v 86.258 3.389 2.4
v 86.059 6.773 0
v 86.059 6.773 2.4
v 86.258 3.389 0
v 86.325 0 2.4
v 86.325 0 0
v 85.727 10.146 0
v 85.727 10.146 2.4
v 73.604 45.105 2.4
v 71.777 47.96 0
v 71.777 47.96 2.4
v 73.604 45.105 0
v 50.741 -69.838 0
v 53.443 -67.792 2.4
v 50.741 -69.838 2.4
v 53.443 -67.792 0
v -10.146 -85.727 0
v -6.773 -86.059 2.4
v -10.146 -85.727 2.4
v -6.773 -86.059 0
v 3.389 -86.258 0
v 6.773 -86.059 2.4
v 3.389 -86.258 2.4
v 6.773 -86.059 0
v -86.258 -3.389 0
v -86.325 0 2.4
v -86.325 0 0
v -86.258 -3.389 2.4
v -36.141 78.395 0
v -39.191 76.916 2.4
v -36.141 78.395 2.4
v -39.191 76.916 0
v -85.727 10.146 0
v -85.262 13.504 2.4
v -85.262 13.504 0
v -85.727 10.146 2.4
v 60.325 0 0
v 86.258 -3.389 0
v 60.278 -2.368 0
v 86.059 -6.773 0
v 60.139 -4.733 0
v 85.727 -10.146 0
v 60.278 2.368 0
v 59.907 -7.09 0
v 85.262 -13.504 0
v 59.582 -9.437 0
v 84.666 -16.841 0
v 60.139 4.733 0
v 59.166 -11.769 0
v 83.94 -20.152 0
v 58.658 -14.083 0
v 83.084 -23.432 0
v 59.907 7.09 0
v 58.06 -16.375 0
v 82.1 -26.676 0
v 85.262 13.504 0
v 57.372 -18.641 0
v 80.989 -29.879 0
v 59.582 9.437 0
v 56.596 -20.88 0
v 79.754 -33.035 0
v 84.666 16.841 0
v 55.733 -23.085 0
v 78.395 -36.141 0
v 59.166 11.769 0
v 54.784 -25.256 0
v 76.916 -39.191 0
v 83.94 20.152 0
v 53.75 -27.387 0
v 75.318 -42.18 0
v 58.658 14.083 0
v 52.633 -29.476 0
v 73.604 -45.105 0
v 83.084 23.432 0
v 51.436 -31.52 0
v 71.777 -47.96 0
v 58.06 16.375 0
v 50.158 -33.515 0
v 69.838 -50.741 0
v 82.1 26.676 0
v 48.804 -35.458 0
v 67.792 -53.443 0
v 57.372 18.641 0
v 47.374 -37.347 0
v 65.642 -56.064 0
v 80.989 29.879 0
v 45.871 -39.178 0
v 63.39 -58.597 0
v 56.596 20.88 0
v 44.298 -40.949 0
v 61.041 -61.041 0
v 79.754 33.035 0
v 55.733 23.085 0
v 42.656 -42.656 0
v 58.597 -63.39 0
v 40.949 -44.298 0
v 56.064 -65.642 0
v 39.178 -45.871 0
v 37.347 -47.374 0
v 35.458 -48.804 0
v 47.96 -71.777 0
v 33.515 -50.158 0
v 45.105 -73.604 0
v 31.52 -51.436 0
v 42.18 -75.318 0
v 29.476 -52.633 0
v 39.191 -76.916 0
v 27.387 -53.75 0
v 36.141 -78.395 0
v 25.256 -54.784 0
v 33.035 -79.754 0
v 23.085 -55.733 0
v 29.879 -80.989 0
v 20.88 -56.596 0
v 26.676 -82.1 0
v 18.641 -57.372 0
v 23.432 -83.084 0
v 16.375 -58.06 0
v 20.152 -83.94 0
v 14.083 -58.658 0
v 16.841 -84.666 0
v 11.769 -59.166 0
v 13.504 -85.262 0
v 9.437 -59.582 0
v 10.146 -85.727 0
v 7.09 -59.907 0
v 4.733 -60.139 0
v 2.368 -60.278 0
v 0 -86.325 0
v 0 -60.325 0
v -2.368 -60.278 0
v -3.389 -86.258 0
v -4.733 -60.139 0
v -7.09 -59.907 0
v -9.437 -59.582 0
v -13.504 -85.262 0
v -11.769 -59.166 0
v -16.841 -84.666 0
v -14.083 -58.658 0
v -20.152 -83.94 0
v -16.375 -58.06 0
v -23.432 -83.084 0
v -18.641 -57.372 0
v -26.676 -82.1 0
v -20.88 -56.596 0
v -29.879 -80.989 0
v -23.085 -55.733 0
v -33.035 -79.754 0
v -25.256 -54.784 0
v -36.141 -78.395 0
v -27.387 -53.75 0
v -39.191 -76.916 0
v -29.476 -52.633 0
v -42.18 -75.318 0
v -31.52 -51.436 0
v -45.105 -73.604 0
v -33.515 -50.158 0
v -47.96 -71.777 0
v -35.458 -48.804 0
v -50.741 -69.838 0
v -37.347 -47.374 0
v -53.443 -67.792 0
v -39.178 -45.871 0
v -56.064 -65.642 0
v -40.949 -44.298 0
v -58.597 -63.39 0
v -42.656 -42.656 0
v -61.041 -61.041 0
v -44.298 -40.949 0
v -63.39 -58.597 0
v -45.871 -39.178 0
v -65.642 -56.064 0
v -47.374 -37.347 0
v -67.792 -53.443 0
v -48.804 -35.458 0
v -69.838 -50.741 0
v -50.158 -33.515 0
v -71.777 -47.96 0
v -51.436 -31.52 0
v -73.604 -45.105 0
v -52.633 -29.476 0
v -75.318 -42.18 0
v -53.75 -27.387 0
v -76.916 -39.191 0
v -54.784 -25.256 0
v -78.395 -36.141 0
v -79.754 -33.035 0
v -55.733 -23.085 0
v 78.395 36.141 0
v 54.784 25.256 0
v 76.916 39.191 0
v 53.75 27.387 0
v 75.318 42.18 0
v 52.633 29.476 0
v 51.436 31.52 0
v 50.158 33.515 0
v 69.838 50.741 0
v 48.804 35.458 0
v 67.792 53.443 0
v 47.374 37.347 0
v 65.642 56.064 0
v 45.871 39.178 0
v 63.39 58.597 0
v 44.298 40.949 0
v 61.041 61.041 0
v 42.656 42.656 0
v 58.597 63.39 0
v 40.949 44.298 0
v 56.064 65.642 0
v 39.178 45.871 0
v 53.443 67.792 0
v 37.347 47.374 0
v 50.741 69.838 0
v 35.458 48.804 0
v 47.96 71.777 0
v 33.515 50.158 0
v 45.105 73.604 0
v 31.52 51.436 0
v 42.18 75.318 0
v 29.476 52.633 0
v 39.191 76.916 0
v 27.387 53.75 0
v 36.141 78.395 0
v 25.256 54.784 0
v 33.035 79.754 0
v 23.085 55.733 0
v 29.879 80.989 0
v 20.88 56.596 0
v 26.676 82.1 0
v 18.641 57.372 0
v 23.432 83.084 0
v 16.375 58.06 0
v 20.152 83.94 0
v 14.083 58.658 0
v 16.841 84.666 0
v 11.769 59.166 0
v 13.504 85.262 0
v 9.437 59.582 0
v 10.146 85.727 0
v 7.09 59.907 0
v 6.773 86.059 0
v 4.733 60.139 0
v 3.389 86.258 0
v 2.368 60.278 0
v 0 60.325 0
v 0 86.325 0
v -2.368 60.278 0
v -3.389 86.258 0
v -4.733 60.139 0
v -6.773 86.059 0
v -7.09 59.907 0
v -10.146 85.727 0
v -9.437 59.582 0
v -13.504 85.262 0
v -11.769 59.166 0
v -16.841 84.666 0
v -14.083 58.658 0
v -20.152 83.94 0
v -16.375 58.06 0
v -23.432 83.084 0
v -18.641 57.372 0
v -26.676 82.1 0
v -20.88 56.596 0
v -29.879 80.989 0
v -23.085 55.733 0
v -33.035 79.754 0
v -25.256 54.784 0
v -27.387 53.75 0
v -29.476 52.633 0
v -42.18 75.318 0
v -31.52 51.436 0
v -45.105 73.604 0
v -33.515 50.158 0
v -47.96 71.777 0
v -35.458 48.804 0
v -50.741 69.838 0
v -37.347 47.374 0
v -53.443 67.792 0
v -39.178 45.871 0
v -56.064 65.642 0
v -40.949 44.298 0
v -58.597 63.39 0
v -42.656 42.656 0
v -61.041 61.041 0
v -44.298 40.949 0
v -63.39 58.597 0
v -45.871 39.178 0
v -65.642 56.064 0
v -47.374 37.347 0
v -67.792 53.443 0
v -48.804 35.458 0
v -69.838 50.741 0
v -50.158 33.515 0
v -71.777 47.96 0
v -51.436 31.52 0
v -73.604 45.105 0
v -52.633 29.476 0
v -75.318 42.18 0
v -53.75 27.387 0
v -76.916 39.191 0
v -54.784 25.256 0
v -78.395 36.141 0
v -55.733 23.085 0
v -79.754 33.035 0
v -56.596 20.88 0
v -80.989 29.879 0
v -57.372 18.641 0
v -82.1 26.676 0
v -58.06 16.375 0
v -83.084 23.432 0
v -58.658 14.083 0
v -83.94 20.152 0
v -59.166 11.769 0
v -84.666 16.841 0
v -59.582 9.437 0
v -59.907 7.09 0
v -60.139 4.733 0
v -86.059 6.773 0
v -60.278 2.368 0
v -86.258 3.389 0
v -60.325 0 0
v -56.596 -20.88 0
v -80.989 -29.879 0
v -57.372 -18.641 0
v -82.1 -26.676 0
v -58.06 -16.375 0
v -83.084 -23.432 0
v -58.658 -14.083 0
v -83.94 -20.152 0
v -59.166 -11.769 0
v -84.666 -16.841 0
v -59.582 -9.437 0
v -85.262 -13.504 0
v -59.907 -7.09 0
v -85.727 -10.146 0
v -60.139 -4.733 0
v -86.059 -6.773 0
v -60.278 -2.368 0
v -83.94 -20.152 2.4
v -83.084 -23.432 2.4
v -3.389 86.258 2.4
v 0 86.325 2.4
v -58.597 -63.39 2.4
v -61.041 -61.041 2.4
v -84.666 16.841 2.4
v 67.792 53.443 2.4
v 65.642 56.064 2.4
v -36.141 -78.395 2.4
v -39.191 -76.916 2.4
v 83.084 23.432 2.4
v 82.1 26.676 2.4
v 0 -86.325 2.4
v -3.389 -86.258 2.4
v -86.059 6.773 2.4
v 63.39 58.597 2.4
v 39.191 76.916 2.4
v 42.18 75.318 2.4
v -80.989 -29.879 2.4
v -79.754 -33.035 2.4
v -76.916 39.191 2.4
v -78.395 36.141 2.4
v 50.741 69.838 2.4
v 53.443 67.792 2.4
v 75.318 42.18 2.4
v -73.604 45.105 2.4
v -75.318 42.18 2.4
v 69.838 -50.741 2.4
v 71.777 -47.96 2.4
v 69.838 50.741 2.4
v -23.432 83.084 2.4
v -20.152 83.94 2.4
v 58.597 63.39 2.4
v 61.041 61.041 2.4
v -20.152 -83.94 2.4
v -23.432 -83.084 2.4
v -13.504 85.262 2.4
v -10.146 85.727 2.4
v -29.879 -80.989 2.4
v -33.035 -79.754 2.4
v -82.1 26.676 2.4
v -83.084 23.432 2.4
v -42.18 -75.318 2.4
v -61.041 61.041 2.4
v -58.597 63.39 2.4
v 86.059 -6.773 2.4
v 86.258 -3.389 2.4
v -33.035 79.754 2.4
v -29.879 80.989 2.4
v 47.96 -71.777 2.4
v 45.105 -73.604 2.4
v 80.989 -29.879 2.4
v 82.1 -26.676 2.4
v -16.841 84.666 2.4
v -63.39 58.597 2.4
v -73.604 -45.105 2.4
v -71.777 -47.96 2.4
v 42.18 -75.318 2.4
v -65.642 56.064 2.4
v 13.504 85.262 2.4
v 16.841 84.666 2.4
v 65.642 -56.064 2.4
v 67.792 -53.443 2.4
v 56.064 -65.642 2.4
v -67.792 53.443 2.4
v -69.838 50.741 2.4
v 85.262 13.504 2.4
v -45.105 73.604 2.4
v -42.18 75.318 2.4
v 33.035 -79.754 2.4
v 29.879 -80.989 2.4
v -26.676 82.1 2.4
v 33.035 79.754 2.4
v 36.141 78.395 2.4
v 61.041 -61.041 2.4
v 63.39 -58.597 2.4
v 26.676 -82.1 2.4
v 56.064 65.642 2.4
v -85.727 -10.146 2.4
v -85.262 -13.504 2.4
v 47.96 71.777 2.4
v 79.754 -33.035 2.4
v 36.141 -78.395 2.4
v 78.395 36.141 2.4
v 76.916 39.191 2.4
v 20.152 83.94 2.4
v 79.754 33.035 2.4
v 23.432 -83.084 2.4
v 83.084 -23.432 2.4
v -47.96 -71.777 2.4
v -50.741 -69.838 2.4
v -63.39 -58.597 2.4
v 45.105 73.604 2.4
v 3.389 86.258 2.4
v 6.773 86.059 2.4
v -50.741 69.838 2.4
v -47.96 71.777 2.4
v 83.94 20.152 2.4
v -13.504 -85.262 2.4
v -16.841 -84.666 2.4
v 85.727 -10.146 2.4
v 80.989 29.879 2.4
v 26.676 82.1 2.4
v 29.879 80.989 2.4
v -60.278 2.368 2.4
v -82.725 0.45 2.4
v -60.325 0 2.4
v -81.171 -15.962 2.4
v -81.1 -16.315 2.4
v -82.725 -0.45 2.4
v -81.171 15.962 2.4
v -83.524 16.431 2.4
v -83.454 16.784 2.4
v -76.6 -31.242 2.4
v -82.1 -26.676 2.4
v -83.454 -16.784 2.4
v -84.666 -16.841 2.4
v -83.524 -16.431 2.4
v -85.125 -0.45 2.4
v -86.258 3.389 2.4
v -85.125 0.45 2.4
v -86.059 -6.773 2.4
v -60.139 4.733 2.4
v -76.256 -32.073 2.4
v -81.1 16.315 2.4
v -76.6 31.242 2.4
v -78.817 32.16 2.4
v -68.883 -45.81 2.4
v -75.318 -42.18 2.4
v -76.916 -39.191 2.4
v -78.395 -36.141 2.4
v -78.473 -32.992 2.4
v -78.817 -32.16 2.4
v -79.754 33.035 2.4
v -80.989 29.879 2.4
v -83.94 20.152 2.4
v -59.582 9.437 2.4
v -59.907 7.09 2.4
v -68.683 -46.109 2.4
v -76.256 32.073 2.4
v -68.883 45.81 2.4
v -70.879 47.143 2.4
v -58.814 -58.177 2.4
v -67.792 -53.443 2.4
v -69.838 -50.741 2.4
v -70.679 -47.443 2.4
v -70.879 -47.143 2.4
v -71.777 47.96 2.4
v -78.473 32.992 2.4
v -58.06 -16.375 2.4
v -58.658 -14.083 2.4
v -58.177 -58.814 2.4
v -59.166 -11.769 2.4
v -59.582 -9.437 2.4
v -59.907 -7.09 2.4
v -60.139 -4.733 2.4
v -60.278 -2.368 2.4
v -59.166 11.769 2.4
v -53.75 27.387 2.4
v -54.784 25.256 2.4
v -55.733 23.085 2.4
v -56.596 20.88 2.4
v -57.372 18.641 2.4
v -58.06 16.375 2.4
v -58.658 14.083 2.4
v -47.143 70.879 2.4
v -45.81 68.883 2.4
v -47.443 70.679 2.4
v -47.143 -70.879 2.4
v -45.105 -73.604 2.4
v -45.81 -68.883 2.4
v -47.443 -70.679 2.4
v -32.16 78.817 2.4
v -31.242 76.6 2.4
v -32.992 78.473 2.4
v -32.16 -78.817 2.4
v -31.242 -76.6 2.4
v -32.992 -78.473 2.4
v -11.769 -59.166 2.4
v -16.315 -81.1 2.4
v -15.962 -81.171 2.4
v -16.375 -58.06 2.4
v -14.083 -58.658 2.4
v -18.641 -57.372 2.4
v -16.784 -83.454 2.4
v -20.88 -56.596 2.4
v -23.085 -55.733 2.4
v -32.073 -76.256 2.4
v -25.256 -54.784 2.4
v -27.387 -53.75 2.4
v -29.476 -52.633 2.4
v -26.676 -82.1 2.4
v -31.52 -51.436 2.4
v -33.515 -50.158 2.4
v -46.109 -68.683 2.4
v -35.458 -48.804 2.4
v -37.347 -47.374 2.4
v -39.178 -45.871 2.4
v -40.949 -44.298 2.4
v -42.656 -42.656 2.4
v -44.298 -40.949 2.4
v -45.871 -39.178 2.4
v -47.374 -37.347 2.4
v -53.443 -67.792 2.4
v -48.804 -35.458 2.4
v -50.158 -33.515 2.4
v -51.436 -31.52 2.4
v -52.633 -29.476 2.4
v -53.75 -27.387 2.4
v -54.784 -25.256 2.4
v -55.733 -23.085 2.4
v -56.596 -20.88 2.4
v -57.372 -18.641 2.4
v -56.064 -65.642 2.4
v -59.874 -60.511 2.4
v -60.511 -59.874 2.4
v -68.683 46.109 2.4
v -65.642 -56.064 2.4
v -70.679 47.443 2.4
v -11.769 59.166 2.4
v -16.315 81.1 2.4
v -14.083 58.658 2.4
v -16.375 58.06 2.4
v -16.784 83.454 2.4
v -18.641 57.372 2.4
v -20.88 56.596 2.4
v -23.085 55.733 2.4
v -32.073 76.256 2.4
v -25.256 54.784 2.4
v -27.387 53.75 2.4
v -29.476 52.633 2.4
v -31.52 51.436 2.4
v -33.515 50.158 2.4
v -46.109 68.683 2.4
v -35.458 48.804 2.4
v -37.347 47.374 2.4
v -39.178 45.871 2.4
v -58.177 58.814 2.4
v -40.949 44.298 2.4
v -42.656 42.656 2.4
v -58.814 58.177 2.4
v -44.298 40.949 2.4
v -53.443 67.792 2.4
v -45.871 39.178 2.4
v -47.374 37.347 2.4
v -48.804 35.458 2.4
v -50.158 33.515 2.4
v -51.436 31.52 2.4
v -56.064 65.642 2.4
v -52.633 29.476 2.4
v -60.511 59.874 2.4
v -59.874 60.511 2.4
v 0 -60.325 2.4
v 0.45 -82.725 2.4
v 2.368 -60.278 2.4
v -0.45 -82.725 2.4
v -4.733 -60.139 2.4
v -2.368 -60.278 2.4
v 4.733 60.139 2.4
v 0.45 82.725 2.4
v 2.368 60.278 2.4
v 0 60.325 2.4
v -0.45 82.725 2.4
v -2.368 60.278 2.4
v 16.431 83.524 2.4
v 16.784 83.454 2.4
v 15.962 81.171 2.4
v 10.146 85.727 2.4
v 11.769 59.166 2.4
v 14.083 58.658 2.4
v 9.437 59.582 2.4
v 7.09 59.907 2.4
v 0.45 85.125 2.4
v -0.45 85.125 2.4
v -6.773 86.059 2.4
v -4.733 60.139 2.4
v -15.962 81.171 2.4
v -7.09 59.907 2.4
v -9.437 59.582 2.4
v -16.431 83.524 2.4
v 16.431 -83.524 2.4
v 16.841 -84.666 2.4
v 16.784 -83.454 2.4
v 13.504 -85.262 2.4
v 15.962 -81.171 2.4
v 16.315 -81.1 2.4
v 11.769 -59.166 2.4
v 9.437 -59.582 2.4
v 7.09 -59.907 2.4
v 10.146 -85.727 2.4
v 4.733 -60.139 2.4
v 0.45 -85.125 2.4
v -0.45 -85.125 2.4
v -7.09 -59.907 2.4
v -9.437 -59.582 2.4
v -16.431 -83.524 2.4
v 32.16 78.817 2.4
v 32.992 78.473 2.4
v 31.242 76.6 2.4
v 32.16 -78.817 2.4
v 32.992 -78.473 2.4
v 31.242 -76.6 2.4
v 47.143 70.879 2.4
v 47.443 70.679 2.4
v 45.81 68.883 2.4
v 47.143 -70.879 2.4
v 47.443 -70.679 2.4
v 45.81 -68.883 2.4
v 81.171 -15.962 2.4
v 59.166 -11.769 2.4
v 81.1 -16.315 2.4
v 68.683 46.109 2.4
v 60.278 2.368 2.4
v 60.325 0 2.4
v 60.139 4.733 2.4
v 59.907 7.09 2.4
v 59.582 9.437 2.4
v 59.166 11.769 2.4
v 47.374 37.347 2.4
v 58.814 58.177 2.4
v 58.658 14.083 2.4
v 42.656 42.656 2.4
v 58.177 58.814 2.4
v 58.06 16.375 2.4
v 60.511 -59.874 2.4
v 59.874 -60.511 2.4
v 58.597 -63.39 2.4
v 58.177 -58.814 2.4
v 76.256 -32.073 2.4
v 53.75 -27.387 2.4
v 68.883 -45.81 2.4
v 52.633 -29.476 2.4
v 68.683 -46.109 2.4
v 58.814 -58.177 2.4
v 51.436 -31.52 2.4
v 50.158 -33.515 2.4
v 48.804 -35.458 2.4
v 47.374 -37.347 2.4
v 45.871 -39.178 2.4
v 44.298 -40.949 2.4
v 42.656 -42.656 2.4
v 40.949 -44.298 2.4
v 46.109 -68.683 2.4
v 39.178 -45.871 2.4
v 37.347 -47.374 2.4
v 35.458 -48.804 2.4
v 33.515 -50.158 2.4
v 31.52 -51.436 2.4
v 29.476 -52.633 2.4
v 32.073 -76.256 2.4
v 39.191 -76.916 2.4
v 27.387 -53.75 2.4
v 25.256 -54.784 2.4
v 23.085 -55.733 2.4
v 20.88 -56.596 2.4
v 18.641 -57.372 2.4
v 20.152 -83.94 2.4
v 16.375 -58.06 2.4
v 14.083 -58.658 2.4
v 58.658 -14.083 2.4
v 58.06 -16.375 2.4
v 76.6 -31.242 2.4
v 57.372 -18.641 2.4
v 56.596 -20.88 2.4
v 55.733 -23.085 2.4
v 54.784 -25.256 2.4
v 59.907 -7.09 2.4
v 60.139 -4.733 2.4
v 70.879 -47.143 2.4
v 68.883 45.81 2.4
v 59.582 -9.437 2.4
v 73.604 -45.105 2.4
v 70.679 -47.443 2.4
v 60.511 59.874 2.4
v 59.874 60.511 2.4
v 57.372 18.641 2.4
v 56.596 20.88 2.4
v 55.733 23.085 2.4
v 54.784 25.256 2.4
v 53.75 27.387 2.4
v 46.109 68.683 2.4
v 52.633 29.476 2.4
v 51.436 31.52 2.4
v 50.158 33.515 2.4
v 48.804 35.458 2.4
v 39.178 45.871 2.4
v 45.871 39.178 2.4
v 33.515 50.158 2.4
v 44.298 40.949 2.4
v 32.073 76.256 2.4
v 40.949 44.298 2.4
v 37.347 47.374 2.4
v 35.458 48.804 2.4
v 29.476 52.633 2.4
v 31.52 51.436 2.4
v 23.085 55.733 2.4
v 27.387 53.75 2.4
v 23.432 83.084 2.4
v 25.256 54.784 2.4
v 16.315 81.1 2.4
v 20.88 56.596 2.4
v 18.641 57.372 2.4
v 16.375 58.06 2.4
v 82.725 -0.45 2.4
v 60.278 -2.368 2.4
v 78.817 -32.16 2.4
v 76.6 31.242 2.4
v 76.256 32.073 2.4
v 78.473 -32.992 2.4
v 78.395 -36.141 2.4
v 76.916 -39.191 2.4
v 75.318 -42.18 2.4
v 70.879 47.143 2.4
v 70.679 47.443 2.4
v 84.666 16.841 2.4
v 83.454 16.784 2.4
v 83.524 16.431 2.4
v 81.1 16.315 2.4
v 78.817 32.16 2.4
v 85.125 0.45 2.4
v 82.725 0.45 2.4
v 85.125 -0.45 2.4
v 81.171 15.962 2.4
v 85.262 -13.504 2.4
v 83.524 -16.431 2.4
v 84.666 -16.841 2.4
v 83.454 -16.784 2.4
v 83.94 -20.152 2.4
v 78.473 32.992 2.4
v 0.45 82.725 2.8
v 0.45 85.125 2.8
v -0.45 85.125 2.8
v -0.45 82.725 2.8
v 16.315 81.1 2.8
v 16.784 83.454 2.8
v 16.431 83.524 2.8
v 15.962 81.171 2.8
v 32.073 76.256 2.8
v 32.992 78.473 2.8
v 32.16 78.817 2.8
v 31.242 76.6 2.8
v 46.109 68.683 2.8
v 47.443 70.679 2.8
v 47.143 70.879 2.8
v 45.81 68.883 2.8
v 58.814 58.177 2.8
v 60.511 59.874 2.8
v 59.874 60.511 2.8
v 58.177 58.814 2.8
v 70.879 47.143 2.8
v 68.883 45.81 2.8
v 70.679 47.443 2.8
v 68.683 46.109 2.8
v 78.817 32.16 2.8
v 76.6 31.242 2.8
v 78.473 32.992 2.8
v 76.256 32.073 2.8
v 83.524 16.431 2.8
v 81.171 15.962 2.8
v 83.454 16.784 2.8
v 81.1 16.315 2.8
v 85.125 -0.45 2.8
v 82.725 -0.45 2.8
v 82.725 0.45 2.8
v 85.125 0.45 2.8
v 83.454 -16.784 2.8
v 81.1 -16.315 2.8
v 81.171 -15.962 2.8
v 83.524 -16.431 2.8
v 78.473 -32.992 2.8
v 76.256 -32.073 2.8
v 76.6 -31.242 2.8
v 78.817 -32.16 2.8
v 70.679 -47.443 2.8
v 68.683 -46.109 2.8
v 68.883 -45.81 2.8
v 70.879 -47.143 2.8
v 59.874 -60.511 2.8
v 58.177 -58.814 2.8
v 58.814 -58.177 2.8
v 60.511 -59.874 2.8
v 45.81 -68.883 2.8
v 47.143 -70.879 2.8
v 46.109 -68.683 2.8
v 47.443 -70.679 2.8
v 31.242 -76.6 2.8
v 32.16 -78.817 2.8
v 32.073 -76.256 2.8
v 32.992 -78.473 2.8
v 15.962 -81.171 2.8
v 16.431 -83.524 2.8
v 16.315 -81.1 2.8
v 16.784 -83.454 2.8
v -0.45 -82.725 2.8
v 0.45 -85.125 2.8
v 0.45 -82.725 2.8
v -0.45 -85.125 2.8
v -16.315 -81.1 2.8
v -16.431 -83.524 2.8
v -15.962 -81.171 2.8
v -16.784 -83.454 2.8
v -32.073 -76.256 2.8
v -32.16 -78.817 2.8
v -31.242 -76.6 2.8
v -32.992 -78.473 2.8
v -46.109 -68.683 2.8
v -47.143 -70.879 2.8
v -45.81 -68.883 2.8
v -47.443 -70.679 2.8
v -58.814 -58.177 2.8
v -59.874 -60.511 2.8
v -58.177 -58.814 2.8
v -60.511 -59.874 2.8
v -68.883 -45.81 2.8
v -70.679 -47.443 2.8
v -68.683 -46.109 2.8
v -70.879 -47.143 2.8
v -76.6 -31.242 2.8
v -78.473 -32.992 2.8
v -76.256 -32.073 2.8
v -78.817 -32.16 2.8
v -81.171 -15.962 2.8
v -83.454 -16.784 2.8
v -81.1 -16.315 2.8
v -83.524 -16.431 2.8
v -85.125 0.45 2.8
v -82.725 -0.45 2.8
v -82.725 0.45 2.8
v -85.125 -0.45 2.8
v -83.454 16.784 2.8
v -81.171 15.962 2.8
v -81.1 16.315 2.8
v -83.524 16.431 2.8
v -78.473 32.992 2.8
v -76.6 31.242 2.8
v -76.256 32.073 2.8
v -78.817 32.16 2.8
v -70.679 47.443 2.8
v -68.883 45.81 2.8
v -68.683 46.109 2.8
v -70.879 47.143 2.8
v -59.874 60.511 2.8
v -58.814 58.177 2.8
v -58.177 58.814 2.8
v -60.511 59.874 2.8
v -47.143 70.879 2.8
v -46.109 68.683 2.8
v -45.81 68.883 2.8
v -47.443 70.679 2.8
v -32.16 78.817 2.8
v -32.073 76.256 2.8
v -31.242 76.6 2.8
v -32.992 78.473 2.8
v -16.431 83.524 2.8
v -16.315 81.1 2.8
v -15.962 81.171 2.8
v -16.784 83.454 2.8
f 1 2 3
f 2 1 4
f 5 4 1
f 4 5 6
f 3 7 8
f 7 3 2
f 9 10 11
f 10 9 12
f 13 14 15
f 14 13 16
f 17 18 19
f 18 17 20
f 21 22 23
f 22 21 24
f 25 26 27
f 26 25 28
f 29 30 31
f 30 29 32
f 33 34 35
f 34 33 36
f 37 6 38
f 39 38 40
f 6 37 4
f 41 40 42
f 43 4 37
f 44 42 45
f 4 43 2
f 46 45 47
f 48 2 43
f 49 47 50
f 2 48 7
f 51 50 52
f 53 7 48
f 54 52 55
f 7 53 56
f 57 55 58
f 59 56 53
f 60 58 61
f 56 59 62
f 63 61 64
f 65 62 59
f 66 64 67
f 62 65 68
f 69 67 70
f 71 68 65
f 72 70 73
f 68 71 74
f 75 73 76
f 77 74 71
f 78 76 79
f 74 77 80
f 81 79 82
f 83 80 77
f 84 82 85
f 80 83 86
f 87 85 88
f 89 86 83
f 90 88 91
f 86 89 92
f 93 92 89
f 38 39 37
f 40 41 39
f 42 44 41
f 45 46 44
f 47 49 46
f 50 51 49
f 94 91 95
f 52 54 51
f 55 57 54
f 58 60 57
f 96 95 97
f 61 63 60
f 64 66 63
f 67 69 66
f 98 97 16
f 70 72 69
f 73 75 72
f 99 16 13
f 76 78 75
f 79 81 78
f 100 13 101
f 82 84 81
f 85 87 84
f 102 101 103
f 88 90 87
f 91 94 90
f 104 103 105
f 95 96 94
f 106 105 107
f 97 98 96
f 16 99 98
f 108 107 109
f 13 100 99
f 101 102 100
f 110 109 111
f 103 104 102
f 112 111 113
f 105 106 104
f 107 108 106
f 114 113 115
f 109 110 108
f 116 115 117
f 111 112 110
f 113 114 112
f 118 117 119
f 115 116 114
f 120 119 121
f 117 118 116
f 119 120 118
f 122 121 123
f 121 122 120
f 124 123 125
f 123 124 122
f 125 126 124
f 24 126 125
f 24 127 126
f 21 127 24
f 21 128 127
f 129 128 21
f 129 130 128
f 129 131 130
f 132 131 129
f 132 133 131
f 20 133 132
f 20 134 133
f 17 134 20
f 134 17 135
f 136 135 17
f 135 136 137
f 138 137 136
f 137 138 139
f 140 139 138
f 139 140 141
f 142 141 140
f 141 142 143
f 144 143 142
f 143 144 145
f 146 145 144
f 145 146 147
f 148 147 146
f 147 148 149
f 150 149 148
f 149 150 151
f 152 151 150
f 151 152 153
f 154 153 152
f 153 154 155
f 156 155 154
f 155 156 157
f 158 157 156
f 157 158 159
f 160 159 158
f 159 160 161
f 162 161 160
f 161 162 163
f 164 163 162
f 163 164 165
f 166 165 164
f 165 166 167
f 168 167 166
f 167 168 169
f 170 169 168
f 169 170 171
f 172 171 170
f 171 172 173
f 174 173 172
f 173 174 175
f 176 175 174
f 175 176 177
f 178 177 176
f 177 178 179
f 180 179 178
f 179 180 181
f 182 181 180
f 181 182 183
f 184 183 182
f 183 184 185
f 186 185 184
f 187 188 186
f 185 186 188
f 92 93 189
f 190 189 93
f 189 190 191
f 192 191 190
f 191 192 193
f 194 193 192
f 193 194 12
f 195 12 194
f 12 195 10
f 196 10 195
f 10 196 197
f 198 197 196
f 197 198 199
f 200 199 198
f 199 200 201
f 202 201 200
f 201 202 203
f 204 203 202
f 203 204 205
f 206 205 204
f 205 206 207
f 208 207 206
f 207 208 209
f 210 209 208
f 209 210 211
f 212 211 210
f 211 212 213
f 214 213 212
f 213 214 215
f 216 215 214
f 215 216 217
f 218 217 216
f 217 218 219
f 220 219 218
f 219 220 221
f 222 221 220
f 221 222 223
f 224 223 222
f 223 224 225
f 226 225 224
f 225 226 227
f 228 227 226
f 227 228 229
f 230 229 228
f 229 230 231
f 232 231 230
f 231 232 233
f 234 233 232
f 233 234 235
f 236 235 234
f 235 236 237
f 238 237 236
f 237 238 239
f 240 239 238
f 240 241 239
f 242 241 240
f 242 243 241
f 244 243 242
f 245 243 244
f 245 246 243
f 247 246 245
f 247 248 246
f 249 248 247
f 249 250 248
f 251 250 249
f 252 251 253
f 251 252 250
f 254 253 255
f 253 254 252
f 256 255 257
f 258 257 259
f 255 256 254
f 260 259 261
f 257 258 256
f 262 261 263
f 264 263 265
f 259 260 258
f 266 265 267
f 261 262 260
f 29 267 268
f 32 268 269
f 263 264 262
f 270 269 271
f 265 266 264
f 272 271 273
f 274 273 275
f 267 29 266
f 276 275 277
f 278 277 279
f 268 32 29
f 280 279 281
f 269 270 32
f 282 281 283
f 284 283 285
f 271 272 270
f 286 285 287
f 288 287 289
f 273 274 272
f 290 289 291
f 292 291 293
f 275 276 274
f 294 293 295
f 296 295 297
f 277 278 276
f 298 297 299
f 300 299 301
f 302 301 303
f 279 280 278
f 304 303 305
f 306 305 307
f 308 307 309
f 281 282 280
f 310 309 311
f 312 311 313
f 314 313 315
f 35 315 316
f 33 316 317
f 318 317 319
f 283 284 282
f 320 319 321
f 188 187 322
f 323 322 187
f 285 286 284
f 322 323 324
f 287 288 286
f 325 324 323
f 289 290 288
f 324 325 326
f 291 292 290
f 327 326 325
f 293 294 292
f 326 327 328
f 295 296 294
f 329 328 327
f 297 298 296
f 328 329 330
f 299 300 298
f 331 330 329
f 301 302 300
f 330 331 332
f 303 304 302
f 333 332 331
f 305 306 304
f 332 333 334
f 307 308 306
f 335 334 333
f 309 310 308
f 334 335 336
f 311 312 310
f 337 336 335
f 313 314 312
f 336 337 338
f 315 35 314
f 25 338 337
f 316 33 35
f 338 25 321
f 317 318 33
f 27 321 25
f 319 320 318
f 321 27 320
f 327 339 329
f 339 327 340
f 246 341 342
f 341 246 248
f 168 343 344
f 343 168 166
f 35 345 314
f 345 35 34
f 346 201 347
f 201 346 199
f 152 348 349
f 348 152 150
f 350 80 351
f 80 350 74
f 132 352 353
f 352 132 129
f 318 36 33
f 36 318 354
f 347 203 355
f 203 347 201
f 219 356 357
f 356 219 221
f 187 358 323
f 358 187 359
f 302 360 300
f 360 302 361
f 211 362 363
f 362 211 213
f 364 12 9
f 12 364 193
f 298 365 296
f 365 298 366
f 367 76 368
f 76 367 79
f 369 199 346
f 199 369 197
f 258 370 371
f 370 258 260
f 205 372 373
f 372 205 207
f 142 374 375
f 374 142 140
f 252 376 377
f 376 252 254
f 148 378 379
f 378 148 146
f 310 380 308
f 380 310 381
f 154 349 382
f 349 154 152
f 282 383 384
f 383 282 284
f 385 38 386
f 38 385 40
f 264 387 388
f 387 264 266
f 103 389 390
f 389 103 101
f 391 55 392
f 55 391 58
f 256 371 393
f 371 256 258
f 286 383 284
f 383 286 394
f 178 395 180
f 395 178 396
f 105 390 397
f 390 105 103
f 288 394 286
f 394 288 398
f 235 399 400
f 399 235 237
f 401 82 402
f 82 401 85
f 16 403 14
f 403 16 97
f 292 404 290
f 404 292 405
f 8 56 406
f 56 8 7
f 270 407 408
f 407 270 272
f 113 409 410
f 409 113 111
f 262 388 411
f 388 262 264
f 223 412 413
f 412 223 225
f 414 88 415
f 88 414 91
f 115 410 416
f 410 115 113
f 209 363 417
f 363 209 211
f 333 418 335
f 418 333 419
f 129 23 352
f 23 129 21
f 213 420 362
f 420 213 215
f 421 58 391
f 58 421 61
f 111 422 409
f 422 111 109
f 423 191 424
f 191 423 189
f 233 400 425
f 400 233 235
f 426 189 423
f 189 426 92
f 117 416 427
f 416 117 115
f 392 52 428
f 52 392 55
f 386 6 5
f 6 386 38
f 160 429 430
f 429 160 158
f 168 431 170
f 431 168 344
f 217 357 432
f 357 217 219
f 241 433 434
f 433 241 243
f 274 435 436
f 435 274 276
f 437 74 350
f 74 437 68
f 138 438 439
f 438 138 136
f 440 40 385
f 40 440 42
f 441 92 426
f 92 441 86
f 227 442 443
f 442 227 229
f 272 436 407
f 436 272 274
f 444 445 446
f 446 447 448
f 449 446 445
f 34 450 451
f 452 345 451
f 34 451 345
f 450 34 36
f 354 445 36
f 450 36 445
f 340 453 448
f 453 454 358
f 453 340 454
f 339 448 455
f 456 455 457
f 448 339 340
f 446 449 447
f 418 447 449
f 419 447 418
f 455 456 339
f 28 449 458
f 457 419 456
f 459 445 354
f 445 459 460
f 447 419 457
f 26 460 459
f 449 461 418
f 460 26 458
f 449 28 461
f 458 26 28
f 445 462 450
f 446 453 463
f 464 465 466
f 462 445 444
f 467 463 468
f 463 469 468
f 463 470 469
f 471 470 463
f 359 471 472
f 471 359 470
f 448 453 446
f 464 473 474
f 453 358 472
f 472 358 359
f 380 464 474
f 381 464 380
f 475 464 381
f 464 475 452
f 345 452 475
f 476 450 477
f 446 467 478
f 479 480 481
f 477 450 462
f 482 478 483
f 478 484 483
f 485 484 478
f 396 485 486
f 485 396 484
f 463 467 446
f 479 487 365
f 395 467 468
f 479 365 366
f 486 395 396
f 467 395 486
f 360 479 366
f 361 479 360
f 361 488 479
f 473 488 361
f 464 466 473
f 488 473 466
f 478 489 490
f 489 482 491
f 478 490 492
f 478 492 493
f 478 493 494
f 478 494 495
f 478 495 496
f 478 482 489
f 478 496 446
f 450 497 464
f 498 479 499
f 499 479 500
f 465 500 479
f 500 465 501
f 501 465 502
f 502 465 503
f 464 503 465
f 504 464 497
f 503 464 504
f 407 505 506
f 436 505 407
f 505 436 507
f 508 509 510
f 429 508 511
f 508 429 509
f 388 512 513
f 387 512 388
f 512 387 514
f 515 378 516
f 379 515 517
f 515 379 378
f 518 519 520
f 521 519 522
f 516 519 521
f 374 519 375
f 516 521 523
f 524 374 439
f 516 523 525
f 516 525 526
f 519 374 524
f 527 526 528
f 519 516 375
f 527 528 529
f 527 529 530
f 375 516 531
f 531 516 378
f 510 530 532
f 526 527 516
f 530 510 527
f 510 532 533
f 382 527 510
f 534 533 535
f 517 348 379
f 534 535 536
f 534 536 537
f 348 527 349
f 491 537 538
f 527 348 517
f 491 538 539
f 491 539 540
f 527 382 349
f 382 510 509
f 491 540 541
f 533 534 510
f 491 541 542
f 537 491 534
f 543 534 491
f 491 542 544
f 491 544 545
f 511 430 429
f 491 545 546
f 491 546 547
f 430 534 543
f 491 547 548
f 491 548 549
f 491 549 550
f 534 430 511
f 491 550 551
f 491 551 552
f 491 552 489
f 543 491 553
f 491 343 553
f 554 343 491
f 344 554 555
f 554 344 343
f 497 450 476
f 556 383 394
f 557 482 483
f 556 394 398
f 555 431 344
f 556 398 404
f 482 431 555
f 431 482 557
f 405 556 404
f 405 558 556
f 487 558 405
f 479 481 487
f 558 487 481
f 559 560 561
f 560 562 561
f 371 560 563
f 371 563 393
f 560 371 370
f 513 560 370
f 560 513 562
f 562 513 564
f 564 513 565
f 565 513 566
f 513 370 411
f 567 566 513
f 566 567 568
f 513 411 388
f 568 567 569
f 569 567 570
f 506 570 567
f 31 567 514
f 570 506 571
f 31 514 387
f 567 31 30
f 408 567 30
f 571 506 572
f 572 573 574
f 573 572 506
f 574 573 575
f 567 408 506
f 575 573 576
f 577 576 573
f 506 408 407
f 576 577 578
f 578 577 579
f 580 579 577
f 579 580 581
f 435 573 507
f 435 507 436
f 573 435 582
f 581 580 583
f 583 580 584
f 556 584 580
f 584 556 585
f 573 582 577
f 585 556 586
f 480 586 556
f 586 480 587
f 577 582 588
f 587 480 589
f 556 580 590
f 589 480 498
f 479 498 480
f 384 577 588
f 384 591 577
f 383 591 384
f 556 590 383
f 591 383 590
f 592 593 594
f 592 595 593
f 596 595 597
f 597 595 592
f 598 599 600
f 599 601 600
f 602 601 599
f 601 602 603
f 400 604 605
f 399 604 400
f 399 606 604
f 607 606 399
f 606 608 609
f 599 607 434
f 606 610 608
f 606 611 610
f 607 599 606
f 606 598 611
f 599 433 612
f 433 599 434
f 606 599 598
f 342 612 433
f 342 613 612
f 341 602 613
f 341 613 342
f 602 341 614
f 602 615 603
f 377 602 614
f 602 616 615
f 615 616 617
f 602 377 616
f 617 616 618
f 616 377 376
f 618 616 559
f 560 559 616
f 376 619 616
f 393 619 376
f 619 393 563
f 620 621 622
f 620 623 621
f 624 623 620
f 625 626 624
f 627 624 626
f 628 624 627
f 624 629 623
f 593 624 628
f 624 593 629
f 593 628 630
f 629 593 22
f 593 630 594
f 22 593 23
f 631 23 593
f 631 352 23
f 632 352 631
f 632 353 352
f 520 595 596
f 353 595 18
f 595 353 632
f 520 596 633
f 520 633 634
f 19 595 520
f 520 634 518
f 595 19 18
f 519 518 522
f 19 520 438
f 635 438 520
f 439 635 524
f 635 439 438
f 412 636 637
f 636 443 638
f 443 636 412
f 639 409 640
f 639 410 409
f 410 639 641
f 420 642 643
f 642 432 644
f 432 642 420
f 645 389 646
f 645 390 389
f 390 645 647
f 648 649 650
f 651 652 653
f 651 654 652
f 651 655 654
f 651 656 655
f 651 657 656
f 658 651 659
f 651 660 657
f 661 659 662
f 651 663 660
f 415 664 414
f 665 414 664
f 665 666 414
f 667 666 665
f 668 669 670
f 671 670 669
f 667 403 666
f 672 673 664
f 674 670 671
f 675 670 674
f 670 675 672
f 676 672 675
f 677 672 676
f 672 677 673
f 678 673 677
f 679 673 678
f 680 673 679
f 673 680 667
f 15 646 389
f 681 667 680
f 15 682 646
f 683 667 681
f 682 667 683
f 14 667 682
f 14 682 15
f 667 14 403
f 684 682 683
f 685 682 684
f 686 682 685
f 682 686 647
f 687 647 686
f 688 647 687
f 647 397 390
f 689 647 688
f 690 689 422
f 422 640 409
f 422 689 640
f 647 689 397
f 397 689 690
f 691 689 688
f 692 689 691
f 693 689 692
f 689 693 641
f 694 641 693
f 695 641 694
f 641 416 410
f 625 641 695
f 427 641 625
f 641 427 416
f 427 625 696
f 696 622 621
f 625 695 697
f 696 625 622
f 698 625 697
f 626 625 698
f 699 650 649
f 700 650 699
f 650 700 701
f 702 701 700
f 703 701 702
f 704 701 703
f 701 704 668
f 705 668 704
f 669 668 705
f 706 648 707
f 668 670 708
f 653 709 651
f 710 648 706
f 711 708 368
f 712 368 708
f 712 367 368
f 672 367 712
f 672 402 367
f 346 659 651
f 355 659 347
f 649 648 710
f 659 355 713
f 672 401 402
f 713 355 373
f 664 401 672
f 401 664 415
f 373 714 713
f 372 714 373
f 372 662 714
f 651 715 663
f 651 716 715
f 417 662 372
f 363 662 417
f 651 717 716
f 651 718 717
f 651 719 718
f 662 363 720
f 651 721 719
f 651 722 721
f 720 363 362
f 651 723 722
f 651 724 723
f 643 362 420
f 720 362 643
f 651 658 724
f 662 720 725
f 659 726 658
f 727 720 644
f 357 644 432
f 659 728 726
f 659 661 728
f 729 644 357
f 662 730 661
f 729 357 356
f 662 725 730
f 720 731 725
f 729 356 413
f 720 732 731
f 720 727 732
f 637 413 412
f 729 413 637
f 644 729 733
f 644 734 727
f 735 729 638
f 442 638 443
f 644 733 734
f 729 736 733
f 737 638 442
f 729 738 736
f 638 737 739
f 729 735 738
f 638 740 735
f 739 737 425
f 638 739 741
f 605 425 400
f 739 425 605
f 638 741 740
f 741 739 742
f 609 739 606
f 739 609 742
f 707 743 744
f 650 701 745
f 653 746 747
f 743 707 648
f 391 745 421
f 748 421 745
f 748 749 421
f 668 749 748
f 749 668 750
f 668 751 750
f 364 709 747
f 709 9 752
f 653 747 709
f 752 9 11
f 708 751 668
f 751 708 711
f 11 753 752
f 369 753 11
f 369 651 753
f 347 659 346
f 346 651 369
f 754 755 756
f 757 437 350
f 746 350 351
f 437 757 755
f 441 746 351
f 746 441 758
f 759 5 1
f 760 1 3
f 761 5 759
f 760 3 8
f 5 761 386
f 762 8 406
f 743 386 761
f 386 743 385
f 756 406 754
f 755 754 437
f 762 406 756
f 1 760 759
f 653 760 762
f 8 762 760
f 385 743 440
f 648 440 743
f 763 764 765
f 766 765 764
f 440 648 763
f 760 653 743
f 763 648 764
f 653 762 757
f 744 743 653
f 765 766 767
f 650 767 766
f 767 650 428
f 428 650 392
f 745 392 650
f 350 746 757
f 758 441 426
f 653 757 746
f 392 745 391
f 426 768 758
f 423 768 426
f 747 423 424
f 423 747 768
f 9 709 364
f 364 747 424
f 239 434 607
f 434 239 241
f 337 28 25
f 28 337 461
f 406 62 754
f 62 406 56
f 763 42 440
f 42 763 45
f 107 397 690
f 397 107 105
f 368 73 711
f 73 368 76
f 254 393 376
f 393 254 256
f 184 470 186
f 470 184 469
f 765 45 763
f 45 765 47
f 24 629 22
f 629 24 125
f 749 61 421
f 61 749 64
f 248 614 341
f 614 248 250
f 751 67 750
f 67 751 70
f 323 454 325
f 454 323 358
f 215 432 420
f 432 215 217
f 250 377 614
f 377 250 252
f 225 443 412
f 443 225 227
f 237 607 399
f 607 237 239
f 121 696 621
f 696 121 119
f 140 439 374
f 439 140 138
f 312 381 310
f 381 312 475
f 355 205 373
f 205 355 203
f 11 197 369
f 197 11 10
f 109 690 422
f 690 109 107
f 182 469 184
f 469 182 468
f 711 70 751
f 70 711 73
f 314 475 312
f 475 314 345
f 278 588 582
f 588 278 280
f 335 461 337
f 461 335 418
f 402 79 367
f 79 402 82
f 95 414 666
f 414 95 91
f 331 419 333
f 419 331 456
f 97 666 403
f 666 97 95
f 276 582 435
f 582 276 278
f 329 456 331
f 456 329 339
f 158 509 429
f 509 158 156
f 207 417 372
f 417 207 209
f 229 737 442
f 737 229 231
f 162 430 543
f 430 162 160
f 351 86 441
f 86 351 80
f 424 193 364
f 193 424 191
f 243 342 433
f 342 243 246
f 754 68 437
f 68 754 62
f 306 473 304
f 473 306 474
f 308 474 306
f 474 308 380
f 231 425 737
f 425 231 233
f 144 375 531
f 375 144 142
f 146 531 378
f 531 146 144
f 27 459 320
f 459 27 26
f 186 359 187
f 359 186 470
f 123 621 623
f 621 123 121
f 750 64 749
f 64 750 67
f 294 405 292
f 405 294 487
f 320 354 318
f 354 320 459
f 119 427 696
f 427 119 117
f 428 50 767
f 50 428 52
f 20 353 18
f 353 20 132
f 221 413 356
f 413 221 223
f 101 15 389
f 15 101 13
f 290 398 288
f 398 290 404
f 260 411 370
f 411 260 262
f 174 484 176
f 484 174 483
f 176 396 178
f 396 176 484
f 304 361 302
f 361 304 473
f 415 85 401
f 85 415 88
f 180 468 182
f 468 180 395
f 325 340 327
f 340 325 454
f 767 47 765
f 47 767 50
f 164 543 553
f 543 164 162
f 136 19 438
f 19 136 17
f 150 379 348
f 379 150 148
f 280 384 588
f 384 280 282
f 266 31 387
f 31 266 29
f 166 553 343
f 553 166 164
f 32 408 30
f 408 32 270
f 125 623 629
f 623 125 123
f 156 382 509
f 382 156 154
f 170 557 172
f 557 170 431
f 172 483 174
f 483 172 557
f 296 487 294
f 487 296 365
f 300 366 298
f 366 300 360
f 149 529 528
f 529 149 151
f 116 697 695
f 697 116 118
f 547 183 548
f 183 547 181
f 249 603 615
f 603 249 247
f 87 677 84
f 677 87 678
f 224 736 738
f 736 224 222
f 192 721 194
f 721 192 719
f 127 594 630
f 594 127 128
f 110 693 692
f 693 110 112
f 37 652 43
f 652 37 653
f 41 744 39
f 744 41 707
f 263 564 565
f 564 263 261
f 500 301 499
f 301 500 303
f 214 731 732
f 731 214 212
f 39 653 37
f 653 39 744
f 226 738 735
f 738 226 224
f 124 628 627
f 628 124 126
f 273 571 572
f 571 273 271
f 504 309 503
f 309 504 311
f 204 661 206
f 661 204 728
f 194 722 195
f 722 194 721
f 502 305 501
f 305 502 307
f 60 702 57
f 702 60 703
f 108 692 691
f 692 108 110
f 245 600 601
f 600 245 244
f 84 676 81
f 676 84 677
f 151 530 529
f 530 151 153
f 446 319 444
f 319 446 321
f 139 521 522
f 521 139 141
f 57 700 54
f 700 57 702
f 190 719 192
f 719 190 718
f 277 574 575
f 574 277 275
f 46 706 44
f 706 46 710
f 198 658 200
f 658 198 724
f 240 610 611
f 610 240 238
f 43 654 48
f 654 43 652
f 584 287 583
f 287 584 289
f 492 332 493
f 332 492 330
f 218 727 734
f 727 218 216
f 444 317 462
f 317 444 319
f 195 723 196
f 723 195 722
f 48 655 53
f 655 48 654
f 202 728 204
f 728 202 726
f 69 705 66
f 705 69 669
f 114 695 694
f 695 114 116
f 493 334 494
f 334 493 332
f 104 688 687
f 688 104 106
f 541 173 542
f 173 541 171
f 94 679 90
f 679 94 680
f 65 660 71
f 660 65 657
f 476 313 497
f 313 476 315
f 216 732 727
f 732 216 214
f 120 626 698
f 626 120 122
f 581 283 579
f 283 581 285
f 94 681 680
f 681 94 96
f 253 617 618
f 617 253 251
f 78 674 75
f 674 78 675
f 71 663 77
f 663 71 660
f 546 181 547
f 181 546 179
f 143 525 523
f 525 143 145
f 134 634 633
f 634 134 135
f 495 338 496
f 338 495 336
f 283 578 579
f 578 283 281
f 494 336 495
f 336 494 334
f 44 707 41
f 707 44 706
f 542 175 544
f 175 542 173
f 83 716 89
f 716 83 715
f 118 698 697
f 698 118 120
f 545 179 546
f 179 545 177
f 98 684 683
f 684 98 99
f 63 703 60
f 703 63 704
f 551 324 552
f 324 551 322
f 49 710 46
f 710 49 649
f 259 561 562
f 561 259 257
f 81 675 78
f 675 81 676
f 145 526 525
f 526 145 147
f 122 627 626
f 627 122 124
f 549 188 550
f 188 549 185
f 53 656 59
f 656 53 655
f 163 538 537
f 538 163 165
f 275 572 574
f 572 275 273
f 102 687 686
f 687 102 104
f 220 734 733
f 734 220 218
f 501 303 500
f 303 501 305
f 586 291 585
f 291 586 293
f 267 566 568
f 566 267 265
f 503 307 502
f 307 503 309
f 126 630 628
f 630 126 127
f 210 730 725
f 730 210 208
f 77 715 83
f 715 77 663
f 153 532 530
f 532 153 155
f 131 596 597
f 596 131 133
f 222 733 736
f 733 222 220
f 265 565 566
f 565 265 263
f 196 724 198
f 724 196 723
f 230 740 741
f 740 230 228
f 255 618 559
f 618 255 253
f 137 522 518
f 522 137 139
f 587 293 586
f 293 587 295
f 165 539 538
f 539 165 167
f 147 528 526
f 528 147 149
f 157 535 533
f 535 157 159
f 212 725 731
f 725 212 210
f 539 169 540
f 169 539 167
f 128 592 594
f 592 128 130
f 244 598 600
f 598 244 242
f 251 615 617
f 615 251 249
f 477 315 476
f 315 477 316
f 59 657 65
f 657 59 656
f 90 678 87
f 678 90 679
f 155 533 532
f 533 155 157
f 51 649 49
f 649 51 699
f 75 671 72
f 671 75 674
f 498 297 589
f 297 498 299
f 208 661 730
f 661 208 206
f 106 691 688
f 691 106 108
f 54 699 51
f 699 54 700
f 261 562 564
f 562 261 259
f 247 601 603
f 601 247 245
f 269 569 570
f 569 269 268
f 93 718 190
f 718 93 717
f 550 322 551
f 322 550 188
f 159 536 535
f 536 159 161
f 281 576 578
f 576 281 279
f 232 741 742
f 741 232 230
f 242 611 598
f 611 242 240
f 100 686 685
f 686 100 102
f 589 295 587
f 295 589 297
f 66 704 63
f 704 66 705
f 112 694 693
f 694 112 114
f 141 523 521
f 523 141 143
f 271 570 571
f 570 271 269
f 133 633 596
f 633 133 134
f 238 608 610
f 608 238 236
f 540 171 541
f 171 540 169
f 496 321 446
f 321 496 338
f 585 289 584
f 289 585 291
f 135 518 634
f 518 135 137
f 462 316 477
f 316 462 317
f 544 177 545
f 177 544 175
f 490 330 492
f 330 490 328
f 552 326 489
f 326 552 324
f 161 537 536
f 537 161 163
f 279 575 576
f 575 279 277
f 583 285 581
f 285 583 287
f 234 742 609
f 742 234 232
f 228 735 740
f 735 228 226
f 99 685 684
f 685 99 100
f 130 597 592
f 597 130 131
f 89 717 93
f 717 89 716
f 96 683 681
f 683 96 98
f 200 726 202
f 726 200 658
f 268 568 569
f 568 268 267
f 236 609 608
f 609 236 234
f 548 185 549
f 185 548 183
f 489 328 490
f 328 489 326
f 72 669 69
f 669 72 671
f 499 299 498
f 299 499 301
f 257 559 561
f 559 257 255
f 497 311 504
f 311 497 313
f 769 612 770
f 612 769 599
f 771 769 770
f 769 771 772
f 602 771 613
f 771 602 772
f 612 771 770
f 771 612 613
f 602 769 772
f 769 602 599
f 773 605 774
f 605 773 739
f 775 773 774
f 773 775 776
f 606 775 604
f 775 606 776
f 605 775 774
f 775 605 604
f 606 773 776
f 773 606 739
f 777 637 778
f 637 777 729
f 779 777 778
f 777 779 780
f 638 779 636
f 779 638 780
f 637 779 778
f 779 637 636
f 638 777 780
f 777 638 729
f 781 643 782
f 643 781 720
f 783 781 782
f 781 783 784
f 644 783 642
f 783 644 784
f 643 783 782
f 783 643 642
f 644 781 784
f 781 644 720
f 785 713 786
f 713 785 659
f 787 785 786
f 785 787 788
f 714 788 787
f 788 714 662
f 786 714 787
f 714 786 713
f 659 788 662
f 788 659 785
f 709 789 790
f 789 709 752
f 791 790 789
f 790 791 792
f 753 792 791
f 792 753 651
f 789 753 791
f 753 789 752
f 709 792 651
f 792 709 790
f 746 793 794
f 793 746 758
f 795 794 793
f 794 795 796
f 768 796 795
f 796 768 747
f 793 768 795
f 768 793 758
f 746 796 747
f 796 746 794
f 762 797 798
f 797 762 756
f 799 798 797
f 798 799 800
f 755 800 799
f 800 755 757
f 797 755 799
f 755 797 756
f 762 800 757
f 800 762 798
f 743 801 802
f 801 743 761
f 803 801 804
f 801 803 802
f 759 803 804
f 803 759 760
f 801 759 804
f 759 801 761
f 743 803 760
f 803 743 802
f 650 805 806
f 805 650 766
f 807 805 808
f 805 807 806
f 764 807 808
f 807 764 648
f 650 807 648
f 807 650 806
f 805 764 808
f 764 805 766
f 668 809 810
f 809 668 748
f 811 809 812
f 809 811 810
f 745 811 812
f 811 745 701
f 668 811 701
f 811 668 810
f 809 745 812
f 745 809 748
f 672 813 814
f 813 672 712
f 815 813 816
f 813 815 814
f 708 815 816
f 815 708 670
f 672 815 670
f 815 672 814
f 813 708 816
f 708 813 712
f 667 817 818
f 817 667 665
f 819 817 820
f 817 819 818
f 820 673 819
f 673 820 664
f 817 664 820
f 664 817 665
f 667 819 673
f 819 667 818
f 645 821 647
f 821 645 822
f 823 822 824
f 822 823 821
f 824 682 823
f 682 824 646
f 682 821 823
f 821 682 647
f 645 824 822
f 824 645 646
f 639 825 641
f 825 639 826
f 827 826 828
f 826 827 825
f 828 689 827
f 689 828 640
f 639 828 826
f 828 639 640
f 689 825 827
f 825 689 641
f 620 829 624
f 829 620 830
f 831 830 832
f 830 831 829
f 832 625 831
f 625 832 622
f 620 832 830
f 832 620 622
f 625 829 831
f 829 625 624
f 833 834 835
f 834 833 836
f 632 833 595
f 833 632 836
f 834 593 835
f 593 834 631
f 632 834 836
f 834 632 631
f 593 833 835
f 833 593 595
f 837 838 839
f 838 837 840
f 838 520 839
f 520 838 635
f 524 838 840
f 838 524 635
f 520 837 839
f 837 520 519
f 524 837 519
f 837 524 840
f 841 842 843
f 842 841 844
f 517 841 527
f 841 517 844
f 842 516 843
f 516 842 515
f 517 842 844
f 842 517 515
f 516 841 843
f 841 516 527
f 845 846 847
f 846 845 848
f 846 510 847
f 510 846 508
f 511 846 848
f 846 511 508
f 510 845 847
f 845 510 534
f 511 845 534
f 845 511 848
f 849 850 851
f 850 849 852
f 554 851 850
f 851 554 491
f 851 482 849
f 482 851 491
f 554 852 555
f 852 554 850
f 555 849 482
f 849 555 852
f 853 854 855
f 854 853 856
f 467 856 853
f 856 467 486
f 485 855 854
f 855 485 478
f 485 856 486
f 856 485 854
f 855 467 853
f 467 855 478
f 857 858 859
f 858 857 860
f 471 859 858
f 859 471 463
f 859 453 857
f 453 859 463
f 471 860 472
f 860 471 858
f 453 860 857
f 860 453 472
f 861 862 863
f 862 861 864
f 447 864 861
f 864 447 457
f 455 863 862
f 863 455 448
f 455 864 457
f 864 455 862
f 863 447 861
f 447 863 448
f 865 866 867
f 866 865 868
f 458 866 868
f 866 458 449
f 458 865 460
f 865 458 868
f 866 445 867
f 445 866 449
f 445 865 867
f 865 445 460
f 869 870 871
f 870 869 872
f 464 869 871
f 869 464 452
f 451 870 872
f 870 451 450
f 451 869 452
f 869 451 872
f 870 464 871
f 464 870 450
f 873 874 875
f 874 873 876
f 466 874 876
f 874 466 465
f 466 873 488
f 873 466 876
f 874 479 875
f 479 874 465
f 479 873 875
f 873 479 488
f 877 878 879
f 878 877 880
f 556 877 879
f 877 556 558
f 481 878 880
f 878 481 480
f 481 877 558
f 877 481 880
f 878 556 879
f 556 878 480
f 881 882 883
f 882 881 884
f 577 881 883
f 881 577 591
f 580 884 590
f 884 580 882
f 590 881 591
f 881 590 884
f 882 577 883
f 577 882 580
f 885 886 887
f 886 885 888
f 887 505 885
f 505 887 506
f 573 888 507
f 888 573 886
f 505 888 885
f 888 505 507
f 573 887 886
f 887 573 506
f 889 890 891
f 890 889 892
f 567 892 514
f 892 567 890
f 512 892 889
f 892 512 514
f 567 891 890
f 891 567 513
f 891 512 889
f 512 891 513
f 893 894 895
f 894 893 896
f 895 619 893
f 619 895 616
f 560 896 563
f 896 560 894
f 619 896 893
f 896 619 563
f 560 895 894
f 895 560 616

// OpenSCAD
// 32-LED legend collar - Blank
// Generated by build_legend.py. Edit that, not this.
//
// Every label is UPRIGHT - no rotation - so the collar reads
// from across the room whichever pixel you are looking at.
//
// Text is RAISED by TEXT_H. For a two-colour print, pause at
// PLATE_H and swap filament: the text starts exactly there.
//
// Bore is body dia 119.85 + 0.40 clearance.
$fn = 160;
PLATE_H = 2.4;
TEXT_H = 0.6;
TICK_H = 0.4;
R_IN = 60.3250;
R_OUT = 86.3250;

module plate() {
  difference() {
    cylinder(h = PLATE_H, r = R_OUT);
    translate([0, 0, -1]) cylinder(h = PLATE_H + 2, r = R_IN);
  }
}

// Upright: translate only, never rotate.
module lab(x, y, size, txt, bold = true) {
  translate([x, y, PLATE_H])
    linear_extrude(height = TEXT_H)
      text(txt, size = size, halign = "center",
           valign = "center", font = bold ?
           "DejaVu Sans:style=Bold" : "DejaVu Sans");
}

module ticks() {
  for (i = [0 : 31]) {
    a = i * 11.250000;
    major = (i % 2) == 0;
    rotate([0, 0, -a])
      translate([-(major ? 0.45 : 0.18), R_OUT - 3.6, PLATE_H])
        cube([major ? 0.9 : 0.36, 2.4, TICK_H]);
  }
}

module legend() {
  plate();
  ticks();
}

legend();
